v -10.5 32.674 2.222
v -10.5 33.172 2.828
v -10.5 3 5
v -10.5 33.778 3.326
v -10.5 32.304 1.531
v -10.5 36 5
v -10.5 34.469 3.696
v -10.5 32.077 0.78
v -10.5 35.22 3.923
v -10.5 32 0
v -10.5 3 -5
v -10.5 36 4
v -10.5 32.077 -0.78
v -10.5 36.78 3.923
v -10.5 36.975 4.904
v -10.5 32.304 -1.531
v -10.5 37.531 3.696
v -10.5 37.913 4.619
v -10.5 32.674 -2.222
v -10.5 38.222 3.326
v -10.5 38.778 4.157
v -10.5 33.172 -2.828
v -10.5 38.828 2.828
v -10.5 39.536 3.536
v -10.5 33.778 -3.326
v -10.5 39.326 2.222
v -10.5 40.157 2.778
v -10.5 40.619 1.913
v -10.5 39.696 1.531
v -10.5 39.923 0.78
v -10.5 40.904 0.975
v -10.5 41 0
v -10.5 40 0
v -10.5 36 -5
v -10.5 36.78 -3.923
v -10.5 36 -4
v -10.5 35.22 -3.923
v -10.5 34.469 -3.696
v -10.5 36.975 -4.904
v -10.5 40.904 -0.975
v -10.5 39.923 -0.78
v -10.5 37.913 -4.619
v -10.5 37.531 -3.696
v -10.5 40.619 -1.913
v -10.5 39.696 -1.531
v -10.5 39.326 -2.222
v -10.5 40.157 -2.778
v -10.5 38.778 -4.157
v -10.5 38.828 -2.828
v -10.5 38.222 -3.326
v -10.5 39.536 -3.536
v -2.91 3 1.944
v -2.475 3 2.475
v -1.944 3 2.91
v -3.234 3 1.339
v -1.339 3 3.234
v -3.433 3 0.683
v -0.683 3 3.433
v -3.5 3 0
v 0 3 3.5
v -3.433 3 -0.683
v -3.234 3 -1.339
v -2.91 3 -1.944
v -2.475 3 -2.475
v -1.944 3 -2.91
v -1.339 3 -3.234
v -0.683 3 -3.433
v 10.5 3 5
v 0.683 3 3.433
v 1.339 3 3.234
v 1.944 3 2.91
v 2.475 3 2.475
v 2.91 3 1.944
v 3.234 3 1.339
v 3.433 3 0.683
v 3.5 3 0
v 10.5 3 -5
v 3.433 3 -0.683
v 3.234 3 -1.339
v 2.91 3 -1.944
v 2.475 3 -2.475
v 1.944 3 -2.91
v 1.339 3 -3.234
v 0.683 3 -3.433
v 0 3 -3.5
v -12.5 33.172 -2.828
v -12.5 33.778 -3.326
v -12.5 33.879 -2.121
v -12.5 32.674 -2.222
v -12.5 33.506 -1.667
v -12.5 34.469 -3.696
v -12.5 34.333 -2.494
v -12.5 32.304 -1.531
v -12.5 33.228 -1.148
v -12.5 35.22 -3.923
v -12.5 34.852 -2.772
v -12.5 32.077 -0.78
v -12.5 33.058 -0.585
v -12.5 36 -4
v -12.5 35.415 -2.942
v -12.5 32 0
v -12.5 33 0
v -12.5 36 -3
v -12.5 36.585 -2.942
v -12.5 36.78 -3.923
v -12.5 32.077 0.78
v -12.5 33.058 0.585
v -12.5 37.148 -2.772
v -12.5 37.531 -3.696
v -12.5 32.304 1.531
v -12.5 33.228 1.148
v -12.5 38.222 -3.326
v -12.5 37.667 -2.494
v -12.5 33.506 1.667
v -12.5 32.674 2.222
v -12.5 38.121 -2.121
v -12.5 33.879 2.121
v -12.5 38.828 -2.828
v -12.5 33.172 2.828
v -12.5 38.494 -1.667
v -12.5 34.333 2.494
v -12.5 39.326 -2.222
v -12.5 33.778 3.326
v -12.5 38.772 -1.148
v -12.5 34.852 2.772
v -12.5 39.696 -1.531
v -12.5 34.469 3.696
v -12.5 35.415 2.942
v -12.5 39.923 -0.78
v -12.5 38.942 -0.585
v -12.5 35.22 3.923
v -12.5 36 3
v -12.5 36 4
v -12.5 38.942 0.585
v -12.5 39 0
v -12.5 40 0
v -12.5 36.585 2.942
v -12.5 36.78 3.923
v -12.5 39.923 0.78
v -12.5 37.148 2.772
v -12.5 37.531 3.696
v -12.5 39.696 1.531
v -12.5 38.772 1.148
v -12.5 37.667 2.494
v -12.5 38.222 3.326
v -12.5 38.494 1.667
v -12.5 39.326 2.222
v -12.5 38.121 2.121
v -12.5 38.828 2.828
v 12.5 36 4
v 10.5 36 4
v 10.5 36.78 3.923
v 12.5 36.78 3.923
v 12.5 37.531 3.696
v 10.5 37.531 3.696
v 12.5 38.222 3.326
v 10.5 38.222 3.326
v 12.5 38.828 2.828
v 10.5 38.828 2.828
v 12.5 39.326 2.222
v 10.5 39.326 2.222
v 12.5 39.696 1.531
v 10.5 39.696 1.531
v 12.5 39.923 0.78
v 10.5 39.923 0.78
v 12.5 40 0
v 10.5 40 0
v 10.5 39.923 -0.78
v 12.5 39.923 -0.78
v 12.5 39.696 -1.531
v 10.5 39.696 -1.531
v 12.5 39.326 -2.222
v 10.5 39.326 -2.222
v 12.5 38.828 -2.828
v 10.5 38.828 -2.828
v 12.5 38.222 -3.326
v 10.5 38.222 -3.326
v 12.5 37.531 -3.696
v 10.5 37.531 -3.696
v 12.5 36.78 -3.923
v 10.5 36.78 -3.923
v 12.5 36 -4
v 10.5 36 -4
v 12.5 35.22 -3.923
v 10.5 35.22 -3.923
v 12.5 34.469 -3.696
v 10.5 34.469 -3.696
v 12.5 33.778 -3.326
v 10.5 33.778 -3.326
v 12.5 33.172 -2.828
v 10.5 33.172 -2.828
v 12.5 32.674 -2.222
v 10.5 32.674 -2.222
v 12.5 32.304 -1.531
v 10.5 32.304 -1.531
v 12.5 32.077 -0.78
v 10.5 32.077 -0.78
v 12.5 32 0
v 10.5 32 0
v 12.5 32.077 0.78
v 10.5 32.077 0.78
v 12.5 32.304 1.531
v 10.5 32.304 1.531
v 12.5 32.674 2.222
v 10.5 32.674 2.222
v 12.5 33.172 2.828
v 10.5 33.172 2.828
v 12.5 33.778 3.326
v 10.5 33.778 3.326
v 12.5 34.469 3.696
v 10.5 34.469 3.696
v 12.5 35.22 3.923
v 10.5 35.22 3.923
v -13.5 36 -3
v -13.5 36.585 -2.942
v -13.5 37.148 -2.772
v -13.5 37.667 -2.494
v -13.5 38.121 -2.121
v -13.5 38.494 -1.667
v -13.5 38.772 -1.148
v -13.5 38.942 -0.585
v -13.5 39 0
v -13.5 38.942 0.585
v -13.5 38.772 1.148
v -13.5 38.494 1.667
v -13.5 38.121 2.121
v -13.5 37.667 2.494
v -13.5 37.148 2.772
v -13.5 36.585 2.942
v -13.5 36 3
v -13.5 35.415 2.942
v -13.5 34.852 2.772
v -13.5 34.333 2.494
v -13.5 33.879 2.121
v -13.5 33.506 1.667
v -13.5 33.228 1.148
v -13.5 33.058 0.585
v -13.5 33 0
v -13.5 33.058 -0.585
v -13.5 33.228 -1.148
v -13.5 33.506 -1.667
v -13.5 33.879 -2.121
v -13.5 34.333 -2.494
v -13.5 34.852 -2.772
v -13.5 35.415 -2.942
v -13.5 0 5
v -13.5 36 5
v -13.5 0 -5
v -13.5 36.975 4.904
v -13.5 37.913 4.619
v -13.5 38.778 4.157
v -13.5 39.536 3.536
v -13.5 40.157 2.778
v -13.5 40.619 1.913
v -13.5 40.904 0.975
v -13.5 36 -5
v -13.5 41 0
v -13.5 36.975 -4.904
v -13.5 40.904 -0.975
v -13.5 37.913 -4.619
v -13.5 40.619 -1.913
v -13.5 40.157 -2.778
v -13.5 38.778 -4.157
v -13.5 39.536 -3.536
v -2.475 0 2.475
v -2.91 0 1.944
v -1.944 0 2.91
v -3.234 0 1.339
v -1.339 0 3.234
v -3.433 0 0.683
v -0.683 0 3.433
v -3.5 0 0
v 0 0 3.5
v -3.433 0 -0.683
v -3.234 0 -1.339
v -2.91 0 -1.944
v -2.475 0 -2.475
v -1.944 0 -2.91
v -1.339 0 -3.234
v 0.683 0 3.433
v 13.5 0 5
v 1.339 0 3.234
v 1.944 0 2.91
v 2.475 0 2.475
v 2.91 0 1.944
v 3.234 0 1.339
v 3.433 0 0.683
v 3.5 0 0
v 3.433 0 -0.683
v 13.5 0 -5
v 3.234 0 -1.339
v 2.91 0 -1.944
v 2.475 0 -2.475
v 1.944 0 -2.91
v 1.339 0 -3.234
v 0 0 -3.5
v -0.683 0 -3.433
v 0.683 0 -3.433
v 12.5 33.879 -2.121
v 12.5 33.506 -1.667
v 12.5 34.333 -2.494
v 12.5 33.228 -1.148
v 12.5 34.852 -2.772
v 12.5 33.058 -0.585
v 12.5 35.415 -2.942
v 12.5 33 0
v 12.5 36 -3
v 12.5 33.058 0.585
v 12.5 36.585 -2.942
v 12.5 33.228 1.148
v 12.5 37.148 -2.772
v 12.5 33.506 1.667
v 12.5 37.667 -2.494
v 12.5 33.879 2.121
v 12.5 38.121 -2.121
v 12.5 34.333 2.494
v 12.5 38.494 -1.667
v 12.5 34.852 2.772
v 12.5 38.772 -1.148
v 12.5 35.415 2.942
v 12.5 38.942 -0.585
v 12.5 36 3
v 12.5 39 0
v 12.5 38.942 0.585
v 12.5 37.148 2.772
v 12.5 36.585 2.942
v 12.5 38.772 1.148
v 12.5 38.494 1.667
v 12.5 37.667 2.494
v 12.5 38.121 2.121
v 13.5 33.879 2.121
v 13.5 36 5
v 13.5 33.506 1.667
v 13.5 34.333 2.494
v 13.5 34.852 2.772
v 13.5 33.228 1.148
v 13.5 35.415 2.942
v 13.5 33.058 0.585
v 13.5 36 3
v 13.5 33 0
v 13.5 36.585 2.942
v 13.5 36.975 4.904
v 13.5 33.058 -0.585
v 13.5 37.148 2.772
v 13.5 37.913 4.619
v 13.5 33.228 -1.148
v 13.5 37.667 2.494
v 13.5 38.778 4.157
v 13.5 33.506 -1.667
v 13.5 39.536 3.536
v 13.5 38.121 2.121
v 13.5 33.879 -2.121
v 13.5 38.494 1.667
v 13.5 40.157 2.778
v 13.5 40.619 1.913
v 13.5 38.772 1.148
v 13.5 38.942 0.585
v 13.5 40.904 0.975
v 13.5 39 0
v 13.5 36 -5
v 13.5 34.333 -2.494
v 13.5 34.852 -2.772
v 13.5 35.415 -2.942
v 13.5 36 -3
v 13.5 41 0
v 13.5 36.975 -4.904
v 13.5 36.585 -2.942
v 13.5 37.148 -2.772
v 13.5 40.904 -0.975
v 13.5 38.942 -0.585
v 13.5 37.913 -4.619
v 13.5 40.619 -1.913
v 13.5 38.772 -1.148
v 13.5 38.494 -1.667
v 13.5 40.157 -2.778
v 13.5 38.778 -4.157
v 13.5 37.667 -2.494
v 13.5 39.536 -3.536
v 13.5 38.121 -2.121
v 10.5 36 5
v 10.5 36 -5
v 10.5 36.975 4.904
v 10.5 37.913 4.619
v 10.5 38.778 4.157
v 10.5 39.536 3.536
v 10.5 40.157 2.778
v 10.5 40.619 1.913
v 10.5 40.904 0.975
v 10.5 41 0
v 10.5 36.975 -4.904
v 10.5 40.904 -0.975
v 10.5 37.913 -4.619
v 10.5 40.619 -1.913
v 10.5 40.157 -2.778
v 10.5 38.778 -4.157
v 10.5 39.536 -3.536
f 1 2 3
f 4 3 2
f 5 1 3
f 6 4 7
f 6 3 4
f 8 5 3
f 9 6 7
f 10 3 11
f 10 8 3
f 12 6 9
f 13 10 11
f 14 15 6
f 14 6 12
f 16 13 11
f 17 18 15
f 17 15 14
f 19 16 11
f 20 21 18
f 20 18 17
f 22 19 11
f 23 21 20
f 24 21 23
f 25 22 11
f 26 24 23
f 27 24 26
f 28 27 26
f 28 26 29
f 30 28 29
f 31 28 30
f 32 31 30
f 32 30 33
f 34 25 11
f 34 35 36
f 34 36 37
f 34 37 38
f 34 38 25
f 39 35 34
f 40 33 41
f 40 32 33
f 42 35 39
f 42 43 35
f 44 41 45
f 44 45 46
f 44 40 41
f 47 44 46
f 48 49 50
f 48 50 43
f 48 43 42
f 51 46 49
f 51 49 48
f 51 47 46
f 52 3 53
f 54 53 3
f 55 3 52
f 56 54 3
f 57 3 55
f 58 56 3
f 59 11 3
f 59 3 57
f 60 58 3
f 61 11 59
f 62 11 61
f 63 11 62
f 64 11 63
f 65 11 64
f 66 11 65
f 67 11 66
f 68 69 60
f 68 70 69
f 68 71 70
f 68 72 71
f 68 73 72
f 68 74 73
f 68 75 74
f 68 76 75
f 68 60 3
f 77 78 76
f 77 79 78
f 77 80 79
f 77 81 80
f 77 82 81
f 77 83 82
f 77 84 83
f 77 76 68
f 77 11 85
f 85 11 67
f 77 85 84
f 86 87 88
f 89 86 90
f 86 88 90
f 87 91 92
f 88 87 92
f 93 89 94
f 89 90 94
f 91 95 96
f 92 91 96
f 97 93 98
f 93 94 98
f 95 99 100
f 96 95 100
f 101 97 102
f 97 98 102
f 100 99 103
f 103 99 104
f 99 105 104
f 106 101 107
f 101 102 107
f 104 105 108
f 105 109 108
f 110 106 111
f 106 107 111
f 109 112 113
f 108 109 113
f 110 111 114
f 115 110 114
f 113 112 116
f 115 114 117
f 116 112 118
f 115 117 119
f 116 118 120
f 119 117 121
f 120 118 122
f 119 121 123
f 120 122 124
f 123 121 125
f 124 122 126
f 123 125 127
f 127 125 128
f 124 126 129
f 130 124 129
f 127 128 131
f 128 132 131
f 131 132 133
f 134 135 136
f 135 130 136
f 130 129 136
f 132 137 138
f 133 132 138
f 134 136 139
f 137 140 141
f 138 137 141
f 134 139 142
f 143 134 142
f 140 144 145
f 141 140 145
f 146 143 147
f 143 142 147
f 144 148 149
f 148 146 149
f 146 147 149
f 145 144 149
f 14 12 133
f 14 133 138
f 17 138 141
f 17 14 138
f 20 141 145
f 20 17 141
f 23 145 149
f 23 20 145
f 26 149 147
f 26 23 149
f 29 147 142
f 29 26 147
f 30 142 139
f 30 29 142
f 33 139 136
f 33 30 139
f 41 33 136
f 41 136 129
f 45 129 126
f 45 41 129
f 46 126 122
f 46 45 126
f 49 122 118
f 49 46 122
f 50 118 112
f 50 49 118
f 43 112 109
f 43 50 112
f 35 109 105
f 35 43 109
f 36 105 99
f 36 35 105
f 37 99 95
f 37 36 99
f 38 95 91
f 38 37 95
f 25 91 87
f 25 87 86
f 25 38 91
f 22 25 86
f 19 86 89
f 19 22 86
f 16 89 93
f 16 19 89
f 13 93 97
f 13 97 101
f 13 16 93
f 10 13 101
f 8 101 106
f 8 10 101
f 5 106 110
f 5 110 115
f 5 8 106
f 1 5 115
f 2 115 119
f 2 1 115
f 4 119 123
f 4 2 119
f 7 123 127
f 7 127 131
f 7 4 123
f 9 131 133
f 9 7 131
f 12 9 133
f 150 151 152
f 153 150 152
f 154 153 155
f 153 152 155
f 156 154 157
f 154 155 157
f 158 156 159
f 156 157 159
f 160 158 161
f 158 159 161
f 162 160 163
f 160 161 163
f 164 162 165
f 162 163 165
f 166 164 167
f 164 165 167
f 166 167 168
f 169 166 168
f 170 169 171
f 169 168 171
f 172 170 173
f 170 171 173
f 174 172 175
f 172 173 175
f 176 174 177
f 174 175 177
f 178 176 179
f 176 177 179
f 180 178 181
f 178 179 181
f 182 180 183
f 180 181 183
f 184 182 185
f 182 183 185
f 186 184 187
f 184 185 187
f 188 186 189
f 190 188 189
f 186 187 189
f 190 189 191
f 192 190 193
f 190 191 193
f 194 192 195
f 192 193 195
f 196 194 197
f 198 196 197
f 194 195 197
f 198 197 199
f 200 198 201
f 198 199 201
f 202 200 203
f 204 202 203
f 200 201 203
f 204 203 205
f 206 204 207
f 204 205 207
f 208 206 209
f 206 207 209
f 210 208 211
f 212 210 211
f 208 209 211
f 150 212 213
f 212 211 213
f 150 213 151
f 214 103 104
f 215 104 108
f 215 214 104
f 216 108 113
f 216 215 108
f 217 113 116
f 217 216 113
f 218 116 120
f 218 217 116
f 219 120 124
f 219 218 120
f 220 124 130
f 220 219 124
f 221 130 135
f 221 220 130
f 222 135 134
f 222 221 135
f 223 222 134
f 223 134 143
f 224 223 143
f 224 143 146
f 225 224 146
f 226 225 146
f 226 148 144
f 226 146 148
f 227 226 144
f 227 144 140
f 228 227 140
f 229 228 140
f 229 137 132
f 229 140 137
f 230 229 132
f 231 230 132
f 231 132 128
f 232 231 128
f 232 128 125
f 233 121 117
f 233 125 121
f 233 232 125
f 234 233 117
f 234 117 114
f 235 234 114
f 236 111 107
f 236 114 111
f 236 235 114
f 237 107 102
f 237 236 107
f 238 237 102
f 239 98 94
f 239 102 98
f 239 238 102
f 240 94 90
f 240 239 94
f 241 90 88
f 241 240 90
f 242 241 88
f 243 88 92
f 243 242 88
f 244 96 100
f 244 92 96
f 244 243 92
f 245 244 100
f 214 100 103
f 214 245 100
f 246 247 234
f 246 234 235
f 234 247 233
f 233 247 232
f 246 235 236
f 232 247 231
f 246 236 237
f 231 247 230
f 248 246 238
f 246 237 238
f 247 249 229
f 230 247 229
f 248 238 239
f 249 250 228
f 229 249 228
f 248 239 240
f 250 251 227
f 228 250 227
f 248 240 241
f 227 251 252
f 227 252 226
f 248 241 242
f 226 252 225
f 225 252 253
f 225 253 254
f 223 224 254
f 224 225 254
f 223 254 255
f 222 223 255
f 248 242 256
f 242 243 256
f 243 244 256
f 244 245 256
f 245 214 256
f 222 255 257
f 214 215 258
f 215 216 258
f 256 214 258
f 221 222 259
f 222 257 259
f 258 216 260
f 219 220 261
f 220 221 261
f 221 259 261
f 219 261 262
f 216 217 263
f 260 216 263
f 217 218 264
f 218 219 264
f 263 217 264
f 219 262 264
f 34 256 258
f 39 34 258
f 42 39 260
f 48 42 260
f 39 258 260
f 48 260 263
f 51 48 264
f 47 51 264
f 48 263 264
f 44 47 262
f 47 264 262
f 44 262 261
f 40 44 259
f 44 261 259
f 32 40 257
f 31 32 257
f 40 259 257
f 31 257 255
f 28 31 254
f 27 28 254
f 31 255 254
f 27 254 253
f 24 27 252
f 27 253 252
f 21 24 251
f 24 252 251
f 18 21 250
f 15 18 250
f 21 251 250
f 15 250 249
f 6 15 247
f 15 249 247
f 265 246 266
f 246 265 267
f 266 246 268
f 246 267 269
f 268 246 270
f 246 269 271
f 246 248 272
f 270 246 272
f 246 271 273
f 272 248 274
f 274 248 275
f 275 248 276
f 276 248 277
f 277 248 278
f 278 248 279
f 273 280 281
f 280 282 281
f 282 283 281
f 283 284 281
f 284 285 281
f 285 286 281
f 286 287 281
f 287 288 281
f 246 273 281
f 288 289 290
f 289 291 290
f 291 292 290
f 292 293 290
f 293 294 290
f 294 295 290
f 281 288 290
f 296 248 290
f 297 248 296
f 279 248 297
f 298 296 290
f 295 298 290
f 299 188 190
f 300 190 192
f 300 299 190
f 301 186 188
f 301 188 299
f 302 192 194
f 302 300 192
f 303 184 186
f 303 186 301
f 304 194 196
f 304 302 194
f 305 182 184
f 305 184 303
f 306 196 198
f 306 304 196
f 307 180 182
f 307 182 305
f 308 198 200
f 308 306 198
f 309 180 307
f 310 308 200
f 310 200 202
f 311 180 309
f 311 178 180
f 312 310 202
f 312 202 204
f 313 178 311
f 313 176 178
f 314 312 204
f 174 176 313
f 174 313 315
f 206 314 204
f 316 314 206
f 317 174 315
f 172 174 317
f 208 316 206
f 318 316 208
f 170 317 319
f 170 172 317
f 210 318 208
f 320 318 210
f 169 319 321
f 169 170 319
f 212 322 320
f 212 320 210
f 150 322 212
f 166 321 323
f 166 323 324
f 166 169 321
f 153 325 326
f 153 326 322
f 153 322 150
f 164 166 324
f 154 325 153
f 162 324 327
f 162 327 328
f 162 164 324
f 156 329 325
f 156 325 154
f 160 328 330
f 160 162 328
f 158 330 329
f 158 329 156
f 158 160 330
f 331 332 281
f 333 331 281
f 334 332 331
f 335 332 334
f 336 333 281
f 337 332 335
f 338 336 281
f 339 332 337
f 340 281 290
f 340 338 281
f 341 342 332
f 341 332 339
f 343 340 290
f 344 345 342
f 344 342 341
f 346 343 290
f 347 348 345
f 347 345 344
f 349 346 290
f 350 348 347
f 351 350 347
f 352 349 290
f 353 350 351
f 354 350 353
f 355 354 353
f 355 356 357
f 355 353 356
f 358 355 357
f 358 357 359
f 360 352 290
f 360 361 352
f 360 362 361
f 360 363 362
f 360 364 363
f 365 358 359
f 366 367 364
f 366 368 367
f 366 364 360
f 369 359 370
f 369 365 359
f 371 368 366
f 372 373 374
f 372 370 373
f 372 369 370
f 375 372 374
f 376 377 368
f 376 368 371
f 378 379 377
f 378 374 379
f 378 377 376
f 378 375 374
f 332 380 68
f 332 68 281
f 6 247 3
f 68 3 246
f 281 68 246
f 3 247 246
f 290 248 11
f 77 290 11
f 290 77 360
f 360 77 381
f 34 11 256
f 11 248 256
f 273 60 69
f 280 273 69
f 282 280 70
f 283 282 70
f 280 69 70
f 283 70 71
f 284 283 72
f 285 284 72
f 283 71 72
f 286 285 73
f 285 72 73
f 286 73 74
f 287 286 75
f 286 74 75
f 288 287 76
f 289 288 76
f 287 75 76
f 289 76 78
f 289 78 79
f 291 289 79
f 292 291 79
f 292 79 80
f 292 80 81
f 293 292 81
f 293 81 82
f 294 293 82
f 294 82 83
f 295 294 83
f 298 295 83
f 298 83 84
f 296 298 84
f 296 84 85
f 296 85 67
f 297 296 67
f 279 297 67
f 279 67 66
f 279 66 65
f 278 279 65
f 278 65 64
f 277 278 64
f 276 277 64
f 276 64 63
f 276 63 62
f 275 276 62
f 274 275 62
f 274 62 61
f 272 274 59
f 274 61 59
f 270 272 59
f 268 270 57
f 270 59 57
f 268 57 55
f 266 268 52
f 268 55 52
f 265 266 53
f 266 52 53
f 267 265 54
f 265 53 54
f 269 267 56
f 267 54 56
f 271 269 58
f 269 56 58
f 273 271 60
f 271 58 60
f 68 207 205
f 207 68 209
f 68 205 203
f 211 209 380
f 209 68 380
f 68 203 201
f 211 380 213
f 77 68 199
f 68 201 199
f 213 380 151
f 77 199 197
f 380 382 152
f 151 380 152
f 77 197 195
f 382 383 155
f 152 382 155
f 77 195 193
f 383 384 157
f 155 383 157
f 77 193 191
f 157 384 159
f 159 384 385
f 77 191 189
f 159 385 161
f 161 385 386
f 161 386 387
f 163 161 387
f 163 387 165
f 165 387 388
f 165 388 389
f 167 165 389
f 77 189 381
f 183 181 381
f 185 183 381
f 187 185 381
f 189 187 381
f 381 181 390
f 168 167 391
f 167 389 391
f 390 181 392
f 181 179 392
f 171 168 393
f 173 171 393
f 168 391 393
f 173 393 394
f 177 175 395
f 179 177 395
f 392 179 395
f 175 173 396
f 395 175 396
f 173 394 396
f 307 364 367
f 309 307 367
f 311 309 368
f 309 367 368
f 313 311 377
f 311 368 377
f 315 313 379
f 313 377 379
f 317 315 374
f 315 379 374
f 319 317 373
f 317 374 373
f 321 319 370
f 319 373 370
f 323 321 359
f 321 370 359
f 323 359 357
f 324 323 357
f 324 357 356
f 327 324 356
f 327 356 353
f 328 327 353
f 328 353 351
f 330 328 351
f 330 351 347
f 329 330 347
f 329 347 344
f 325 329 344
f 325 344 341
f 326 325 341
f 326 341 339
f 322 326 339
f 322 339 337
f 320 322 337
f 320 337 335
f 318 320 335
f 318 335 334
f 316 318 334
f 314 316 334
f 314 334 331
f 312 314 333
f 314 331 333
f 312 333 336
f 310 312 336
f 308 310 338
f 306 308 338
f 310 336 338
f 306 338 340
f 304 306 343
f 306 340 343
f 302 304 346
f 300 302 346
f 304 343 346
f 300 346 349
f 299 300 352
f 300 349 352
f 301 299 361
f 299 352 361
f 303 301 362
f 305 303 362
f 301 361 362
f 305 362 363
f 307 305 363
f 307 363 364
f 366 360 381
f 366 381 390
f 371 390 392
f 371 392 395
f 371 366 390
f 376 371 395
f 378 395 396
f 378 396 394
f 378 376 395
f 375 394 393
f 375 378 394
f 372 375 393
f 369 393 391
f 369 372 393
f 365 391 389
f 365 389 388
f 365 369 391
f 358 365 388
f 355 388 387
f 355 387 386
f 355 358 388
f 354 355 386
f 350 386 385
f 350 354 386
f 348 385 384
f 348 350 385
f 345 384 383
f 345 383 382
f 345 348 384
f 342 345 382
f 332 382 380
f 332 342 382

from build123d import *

# Parameters (mm, degrees)
SKETCH1_W           = 27
SKETCH1_H           = 10
BOSS_EXTRUDE1_DEPTH = 3
SKETCH5_R           = 3
BOSS_EXTRUDE3_DEPTH = 3
SKETCH6_R           = 1.5
CUT_EXTRUDE1_DEPTH  = 3
SKETCH7_R           = 4
CUT_EXTRUDE2_DEPTH  = 2
SKETCH8_R           = 3.5
CUT_EXTRUDE4_DEPTH  = 41.635575547


with BuildPart() as part:
    # Sketch1 → Boss-Extrude1 (new body)
    with BuildSketch(Plane(origin=(0, 0, 0), x_dir=(1, 0, 0), z_dir=(0, 1, 0))):
        Rectangle(SKETCH1_W, SKETCH1_H)
    boss_extrude1 = extrude(amount=BOSS_EXTRUDE1_DEPTH)

    # Sketch5 → Boss-Extrude3 (add)
    with BuildSketch(Plane(origin=(13.5, 0, 0), x_dir=(0, 0, -1), z_dir=(1, 0, 0))):
        with BuildLine():
            Line((-5, 3), (5, 3))
            Line((5, 3), (5, 36))
            ThreePointArc((5, 36), (0, 41), (-5, 36))
            Line((-5, 36), (-5, 3))
        make_face()
        with Locations((0, 36)):
            Circle(SKETCH5_R, mode=Mode.SUBTRACT)
    boss_extrude3 = extrude(amount=-BOSS_EXTRUDE3_DEPTH)

    # Sketch6 → Cut-Extrude1 (cut)
    with BuildSketch(Plane(origin=(0, 3, 0), x_dir=(1, 0, 0), z_dir=(0, 1, 0))):
        with Locations(Location((0, 0, 0), (0, 0, 270))):
            Circle(SKETCH6_R)
    extrude(amount=-CUT_EXTRUDE1_DEPTH, mode=Mode.SUBTRACT)

    # Sketch7 → Cut-Extrude2 (cut)
    with BuildSketch(Plane.ZY.offset(-10.5)):
        with Locations((0, 36)):
            Circle(SKETCH7_R)
    cut_extrude2 = extrude(amount=-CUT_EXTRUDE2_DEPTH, mode=Mode.SUBTRACT)

    # Mirror3: Boss-Extrude1, Boss-Extrude3, Cut-Extrude2 across plane
    add(boss_extrude1.mirror(Plane(origin=(0, 0, 0), x_dir=(0, 0, 1), z_dir=(1, 0, 0))))
    add(boss_extrude3.mirror(Plane(origin=(0, 0, 0), x_dir=(0, 0, 1), z_dir=(1, 0, 0))))
    add(cut_extrude2.mirror(Plane(origin=(0, 0, 0), x_dir=(0, 0, 1), z_dir=(1, 0, 0))), mode=Mode.SUBTRACT)

    # Sketch8 → Cut-Extrude4 (cut, through all)
    with BuildSketch(Plane(origin=(0, 3, 0), x_dir=(1, 0, 0), z_dir=(0, 1, 0))):
        with Locations(Location((0, 0, 0), (0, 0, 270))):
            Circle(SKETCH8_R)
    extrude(amount=-CUT_EXTRUDE4_DEPTH, mode=Mode.SUBTRACT)


solid = part.part
